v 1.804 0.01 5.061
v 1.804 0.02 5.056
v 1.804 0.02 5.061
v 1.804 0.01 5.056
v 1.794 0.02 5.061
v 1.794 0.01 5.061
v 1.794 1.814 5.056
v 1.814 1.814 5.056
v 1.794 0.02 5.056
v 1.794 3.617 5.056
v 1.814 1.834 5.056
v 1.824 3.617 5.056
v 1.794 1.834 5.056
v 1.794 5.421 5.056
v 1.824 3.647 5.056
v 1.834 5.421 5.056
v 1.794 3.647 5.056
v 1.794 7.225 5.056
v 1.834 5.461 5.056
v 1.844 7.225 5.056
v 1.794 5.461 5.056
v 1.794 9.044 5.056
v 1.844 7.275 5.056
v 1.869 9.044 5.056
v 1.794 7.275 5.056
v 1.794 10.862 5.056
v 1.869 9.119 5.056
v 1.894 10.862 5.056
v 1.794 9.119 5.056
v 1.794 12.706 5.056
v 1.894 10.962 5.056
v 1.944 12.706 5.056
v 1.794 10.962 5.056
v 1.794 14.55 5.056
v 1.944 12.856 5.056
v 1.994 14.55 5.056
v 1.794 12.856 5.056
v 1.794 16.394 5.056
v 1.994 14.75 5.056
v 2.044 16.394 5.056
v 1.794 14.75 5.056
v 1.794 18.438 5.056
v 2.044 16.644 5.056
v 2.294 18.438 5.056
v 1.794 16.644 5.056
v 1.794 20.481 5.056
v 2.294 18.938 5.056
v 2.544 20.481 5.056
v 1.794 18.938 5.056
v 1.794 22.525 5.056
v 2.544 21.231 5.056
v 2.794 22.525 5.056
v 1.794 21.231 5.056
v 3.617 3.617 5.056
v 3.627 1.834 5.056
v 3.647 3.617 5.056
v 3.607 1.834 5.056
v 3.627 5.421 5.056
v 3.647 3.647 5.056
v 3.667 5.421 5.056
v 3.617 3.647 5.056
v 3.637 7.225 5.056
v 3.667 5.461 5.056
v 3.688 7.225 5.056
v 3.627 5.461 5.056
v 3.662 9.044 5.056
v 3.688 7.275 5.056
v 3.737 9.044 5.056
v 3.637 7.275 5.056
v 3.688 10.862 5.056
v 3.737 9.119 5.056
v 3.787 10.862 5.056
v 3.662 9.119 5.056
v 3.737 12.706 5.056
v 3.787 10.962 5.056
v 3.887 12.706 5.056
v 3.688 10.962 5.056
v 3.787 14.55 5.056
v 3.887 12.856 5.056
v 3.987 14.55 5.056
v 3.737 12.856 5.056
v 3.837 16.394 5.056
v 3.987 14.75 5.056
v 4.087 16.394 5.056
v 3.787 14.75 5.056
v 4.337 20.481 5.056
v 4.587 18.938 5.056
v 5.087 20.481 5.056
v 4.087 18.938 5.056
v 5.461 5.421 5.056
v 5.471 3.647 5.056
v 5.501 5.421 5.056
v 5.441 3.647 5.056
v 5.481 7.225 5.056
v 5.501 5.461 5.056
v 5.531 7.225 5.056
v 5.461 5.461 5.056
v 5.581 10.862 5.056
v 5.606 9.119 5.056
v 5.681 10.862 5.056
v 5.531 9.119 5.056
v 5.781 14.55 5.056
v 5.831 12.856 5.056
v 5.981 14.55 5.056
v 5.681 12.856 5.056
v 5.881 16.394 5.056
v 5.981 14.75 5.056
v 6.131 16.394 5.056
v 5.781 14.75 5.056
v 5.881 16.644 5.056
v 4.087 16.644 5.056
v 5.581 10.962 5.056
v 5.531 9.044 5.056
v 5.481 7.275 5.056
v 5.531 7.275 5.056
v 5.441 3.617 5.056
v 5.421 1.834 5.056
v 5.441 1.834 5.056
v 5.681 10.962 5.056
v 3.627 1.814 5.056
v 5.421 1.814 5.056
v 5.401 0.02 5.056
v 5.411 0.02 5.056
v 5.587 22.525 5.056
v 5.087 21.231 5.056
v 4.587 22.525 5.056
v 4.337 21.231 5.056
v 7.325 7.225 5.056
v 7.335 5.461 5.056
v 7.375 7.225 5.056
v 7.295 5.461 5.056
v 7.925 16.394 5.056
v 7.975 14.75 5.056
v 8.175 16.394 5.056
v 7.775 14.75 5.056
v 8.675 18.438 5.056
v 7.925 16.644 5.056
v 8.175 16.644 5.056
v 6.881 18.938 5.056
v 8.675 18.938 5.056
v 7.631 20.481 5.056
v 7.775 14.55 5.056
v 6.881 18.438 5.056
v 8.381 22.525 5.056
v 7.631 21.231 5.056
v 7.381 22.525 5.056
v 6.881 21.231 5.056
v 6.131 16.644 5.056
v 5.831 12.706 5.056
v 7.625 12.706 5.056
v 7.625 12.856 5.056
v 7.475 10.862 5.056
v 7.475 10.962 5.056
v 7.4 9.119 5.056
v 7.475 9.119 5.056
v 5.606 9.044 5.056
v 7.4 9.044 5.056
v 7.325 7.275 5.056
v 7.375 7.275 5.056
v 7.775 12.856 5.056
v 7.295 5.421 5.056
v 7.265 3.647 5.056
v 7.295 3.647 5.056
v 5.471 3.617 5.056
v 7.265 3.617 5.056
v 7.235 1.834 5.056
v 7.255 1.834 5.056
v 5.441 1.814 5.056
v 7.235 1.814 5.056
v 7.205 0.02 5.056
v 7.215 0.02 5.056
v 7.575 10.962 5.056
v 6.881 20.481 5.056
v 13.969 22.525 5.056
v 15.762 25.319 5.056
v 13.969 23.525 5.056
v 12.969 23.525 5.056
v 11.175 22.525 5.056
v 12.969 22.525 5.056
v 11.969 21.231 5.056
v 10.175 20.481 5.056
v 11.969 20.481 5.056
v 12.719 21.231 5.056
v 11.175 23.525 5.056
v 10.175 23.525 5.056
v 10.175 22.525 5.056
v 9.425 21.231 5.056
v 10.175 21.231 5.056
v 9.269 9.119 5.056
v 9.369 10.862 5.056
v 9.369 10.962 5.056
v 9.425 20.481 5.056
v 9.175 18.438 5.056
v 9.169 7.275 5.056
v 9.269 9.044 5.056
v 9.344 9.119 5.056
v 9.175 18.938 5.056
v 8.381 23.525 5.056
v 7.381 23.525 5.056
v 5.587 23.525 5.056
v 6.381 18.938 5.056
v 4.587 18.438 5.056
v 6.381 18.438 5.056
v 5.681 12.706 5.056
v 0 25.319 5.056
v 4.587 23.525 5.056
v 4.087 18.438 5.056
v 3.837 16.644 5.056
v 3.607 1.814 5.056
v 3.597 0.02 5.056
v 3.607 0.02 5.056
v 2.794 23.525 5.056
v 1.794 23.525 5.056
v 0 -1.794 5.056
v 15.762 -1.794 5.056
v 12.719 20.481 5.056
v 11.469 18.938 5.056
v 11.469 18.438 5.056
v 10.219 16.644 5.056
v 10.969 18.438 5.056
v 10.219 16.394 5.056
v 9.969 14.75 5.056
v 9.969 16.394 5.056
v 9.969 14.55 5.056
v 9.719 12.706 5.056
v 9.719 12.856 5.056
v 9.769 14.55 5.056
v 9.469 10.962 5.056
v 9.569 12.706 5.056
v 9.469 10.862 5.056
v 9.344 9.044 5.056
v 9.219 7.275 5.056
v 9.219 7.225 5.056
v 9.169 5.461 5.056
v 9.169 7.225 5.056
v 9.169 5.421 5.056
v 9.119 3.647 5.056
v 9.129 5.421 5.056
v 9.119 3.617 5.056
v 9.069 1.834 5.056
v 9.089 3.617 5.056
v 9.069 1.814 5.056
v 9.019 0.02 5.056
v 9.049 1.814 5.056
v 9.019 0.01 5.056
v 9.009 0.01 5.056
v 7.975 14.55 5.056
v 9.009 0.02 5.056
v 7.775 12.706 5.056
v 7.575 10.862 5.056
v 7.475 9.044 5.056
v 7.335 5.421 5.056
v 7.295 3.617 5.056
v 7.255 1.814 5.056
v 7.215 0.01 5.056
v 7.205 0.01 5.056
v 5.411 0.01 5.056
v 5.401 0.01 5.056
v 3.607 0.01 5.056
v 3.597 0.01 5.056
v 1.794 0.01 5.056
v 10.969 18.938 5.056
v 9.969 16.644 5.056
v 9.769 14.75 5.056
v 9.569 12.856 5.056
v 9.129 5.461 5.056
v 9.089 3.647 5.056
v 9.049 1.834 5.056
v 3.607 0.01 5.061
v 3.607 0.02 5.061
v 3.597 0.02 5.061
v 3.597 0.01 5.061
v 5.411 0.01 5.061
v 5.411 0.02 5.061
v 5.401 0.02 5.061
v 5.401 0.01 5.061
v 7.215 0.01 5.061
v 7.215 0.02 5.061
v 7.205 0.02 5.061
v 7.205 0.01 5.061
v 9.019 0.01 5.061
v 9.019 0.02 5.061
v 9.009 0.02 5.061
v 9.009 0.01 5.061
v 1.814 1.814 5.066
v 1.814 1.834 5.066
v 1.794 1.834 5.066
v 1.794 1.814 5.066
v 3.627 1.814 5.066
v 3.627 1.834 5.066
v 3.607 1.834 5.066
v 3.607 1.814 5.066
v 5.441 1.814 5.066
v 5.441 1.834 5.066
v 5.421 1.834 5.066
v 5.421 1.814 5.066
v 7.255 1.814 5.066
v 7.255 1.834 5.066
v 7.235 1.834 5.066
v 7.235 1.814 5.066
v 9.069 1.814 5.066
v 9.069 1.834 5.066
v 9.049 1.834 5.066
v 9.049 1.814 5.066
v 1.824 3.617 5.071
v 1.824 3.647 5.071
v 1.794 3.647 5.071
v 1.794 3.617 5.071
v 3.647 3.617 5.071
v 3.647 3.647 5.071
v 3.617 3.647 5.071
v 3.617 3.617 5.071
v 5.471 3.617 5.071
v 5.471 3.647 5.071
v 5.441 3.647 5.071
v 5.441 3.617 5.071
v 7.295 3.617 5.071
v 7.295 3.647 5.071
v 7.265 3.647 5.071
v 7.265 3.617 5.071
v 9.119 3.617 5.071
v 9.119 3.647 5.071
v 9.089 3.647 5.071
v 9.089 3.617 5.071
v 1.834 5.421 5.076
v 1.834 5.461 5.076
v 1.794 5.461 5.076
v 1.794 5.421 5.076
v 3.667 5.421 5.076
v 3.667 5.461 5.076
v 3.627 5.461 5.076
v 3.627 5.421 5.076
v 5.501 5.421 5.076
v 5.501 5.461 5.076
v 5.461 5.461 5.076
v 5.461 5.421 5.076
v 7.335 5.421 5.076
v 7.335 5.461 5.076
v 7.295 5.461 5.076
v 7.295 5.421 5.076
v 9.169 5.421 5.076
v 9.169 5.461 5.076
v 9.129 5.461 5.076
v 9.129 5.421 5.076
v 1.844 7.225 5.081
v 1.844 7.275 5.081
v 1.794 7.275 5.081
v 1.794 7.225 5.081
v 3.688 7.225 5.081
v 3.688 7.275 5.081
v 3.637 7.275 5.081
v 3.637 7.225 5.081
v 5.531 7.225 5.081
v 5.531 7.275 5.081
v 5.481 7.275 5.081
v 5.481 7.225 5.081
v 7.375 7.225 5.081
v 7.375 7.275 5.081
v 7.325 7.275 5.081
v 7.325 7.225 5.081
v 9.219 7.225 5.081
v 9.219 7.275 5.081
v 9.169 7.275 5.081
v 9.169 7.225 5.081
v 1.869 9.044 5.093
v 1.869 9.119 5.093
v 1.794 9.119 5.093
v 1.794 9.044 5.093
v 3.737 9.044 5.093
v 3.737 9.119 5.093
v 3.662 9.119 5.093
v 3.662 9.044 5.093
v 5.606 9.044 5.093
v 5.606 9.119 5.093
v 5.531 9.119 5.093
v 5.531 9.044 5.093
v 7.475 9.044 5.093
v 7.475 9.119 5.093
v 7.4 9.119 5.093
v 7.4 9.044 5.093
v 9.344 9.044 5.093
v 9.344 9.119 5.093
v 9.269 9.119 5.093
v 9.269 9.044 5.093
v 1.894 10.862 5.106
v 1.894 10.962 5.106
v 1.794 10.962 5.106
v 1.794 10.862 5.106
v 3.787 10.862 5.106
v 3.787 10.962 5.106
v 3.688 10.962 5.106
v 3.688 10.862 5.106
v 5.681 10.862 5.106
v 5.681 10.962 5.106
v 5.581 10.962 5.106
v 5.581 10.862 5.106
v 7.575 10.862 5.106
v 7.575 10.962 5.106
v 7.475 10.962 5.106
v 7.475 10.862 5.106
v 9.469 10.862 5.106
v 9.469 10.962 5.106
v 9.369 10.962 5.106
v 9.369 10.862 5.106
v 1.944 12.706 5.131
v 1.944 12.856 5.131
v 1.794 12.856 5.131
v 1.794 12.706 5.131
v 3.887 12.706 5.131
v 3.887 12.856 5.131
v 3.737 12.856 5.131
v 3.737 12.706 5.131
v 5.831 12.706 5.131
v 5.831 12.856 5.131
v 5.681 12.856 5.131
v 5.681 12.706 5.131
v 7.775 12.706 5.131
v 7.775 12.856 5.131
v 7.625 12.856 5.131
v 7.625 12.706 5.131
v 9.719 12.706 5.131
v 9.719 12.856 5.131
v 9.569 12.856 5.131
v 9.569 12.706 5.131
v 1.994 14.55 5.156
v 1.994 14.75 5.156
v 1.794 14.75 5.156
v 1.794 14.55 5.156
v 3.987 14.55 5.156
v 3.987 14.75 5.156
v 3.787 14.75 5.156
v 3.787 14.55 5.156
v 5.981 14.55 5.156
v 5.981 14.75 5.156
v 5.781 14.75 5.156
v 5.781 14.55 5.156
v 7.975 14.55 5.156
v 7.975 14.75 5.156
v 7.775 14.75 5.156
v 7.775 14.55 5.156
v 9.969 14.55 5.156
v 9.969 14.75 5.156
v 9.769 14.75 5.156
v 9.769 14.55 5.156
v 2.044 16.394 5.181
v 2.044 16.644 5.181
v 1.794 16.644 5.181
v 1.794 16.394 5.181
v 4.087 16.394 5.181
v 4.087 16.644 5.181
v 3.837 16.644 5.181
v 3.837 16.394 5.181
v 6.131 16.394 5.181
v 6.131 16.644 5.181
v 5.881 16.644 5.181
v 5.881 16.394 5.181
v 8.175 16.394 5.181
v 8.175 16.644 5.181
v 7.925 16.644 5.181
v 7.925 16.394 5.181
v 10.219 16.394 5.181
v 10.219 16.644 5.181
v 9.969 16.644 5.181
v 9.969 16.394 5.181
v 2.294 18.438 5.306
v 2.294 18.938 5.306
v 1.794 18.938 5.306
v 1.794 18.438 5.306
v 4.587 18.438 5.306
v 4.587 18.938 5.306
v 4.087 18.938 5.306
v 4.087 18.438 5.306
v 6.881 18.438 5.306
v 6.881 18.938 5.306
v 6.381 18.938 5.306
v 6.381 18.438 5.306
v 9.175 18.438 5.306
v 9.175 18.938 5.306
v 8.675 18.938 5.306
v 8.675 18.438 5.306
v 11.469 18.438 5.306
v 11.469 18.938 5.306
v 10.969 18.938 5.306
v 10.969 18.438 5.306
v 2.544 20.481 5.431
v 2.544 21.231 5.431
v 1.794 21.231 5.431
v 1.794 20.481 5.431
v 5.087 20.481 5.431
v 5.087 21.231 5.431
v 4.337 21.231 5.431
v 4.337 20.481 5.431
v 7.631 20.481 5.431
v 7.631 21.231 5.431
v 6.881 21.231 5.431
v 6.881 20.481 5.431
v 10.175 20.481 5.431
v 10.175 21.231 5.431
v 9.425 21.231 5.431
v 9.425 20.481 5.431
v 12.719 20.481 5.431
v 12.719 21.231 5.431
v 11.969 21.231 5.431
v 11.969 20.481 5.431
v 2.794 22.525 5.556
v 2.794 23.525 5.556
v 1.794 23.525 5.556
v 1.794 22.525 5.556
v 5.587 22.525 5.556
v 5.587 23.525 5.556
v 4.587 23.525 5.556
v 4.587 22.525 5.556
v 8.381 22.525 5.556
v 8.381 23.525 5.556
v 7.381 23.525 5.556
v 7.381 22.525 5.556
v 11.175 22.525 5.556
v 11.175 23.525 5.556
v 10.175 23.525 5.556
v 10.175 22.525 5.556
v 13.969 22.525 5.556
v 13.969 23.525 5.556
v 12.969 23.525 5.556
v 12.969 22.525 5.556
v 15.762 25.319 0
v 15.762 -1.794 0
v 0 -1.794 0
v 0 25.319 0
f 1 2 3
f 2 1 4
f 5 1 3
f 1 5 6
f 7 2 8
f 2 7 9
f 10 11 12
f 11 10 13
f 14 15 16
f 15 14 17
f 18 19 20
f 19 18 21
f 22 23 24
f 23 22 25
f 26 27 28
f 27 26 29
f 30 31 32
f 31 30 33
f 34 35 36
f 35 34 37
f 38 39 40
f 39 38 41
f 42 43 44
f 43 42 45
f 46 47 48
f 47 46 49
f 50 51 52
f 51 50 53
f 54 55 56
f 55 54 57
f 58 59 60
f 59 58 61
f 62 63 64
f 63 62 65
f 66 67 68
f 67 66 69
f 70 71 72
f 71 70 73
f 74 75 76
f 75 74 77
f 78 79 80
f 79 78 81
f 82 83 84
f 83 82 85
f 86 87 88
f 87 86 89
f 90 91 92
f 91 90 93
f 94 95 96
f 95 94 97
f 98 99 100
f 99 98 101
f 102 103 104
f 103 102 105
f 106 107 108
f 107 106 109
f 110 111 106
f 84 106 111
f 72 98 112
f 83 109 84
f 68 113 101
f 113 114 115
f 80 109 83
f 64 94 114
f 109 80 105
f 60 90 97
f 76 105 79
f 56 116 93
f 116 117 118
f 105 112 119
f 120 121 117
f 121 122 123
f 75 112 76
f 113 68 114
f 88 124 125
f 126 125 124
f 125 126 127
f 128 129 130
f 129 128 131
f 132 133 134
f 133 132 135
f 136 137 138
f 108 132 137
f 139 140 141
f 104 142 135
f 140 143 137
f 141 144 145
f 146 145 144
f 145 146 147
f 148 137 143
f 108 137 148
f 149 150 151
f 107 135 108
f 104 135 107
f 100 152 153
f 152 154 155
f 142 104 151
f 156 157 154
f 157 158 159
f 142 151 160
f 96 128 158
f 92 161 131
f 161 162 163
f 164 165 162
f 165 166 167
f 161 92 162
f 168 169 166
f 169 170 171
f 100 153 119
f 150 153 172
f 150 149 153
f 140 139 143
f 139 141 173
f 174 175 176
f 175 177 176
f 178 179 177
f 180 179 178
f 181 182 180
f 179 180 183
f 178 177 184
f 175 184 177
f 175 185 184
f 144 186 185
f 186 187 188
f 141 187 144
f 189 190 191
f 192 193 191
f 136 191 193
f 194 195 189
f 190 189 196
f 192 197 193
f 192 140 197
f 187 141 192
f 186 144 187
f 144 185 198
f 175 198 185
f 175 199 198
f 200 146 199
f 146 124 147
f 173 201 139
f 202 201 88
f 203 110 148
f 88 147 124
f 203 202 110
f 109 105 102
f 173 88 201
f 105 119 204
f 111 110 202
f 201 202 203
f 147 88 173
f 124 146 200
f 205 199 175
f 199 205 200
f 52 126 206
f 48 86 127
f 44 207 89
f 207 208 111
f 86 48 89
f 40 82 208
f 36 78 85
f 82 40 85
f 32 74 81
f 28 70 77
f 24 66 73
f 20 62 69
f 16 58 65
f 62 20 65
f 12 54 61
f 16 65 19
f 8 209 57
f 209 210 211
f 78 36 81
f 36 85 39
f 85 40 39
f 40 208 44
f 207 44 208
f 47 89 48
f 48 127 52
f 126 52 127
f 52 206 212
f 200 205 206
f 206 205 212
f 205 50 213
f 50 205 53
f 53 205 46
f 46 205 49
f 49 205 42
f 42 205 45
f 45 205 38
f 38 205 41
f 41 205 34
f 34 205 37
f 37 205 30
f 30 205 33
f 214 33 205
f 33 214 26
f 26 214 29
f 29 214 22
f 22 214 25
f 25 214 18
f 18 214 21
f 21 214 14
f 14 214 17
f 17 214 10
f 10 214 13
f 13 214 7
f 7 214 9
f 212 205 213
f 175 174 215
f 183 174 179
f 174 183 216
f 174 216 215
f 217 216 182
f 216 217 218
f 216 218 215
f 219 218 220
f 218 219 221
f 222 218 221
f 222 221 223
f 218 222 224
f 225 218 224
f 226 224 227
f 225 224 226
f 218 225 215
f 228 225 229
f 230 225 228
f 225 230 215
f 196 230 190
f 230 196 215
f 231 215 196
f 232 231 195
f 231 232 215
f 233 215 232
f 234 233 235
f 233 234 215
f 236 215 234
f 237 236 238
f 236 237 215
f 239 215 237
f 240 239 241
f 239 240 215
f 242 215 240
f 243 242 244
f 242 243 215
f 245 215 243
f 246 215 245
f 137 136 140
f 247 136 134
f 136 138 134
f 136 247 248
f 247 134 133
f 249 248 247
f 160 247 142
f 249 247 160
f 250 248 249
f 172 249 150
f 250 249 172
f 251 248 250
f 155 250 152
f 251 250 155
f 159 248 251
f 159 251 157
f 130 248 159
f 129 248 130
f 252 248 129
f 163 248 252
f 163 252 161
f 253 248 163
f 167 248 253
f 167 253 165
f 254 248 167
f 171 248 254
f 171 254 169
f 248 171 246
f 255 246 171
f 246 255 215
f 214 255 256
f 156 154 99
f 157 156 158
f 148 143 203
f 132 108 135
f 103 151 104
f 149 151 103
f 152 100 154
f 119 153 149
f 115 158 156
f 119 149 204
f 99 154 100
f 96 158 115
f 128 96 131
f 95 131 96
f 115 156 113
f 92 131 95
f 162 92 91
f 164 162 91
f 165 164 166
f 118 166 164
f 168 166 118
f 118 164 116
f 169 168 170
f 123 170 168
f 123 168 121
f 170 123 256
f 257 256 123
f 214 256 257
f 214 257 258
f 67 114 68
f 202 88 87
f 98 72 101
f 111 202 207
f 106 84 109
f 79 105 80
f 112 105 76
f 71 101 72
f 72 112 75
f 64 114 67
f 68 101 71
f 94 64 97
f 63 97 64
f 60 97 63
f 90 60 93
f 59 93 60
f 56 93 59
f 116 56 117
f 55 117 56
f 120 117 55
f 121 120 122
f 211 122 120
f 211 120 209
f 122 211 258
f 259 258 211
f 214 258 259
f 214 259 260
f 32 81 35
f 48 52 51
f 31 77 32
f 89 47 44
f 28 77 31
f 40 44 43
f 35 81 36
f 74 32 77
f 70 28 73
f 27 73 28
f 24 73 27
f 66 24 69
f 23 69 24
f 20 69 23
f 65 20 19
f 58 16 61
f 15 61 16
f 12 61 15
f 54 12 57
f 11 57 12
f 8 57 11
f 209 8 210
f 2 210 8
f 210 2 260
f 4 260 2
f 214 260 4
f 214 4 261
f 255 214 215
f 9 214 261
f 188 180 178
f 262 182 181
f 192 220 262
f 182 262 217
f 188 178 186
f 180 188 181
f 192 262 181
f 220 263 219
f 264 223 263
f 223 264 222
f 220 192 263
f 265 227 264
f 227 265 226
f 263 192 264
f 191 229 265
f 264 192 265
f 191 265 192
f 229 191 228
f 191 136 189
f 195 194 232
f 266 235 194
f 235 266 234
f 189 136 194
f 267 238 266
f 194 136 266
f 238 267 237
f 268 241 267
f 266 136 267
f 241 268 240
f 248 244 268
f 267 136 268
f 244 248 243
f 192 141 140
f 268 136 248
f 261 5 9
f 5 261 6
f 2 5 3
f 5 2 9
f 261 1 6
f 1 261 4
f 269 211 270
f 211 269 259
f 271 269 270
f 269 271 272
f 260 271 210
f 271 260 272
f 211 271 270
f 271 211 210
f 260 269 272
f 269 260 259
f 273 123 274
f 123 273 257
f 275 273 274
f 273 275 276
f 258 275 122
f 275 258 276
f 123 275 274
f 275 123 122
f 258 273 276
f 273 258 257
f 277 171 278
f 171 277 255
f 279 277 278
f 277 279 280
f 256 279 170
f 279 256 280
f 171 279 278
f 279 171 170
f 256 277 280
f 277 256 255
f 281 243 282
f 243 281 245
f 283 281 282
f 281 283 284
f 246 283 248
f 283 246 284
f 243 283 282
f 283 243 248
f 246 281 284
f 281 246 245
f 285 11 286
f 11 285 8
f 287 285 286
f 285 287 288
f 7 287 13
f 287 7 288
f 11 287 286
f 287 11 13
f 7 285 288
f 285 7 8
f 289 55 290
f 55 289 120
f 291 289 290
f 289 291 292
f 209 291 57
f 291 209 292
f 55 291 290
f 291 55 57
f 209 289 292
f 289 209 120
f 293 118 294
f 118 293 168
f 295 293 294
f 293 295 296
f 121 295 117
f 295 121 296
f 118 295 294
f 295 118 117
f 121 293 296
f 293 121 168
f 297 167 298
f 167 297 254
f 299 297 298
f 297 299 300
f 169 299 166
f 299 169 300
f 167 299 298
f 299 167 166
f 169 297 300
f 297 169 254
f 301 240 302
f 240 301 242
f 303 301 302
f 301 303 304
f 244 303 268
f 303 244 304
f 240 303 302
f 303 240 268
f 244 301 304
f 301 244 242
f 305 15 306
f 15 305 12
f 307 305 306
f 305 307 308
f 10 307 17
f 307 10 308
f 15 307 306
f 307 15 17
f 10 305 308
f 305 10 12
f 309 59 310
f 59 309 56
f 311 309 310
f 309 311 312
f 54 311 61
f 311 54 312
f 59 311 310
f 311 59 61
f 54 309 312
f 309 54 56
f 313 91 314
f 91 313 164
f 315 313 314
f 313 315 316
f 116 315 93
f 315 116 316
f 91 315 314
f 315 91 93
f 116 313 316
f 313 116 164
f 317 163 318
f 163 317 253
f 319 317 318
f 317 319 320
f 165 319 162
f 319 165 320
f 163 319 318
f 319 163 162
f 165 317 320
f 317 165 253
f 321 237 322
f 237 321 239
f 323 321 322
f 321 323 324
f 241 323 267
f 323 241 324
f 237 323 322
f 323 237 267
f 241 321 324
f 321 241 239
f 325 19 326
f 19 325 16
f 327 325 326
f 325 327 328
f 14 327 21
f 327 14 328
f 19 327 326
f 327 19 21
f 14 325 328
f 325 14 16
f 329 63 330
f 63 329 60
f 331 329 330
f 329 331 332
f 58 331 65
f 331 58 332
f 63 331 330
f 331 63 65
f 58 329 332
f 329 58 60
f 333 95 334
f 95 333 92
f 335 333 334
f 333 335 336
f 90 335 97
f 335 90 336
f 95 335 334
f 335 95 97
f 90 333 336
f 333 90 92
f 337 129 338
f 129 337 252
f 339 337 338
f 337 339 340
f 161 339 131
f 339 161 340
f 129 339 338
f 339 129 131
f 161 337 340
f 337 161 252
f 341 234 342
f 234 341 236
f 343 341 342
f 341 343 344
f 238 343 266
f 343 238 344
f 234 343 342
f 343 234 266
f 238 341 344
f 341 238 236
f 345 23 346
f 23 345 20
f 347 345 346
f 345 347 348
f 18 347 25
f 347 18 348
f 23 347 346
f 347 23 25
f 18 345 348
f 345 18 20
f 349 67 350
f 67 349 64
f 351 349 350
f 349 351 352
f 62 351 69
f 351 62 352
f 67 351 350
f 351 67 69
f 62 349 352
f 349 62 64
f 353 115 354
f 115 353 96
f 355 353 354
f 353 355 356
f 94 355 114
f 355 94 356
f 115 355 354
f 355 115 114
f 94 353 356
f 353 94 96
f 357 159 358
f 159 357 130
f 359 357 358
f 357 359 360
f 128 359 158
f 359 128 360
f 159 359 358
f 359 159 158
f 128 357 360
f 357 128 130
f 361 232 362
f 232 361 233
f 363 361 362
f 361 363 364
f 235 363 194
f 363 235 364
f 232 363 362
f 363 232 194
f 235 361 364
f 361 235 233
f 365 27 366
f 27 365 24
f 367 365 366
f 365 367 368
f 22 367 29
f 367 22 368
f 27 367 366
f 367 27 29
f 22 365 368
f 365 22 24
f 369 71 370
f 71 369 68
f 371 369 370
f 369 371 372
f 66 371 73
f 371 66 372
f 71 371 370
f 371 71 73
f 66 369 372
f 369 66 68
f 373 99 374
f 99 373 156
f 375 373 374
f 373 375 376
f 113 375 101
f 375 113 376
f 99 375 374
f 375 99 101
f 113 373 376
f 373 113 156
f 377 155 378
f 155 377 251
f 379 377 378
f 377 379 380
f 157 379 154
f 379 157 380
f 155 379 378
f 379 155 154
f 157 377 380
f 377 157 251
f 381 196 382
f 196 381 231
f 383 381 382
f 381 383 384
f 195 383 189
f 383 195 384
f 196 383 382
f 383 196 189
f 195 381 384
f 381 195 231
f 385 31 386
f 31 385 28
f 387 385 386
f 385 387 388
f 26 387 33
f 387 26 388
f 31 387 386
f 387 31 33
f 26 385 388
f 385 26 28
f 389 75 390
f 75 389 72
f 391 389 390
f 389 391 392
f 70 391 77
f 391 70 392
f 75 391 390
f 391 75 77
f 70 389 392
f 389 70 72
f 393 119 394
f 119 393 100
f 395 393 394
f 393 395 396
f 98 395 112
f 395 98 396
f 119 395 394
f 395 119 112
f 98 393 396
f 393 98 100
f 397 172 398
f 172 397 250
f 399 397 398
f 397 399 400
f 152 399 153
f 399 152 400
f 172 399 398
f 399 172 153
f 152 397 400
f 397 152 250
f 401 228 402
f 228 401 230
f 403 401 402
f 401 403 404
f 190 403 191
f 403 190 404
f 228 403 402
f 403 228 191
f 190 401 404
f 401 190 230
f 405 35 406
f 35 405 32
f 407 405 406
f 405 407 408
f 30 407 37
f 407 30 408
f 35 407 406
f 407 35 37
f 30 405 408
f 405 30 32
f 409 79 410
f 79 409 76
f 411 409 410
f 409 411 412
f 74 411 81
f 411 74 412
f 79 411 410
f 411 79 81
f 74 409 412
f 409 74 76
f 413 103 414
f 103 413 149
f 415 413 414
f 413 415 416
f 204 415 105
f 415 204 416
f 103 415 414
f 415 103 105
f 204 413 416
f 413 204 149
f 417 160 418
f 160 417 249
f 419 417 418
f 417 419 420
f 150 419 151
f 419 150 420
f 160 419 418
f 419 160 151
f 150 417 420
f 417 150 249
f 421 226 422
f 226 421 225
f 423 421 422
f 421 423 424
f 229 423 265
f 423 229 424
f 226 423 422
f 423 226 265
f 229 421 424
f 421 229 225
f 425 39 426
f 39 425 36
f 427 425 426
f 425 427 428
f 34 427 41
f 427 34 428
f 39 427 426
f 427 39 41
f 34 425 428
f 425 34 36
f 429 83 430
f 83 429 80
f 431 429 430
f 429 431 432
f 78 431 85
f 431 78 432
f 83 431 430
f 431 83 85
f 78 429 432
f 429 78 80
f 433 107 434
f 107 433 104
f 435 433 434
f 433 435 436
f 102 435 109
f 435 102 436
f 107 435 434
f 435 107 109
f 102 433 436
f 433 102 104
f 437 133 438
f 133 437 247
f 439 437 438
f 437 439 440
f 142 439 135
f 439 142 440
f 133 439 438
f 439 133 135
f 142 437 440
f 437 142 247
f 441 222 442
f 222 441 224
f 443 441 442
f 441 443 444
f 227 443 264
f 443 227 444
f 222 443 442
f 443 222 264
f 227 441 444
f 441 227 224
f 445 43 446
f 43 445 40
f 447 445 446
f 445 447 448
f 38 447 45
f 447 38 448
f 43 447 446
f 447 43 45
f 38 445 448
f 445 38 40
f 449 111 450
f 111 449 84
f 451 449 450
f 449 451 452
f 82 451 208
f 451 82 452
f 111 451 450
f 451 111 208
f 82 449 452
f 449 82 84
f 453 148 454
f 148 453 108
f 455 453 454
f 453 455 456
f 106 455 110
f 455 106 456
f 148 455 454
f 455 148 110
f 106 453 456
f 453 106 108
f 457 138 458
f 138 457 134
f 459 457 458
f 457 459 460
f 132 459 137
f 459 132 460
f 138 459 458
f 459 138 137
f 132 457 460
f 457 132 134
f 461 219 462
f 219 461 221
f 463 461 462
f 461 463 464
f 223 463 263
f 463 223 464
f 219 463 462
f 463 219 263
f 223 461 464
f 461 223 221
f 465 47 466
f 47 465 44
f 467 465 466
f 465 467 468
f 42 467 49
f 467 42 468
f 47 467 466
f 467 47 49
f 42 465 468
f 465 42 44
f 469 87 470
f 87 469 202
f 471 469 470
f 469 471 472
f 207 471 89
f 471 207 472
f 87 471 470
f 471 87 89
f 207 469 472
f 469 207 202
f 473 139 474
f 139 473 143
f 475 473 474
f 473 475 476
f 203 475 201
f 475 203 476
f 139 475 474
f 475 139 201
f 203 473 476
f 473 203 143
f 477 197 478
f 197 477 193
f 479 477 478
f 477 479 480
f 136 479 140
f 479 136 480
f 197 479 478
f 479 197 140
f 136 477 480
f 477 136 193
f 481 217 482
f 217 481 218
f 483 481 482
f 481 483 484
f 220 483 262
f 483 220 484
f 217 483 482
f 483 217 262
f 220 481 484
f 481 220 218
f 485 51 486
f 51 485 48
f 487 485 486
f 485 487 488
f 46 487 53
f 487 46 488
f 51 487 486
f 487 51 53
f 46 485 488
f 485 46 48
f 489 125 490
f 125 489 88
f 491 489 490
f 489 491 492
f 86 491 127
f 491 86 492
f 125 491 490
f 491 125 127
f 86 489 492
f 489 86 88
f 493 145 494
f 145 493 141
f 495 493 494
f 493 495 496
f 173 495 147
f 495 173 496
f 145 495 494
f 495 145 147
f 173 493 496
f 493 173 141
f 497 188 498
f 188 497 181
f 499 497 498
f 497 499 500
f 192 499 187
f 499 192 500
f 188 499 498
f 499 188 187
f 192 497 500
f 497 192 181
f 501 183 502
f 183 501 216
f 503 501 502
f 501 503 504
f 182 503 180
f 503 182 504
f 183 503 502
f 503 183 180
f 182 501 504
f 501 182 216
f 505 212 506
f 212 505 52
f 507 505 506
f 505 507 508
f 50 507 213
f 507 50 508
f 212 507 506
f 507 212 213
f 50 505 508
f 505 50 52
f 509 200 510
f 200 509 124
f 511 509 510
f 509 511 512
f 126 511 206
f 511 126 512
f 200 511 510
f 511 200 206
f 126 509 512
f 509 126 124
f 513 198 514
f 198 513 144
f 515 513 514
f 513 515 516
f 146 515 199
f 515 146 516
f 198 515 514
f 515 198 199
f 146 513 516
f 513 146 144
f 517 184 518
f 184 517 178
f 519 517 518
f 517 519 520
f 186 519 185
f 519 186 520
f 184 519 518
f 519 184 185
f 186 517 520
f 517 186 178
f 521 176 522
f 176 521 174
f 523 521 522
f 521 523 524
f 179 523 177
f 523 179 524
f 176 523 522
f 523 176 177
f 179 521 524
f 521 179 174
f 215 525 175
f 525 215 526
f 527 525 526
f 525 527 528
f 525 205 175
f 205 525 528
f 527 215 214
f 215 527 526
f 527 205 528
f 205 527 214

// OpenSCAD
//Parameters
  //Number of technical replicates
  numReplications = 5;	
  //Cube sizes to test
  cubeSize = [0.01, 0.02, 0.03, 0.04, 0.05, 0.075, 0.1, 0.15, 0.2, 0.25, 0.5, 0.75, 1];
  //End mill diameter 
  endMillD = 0.79375;  //1/32"
  aspectRatio = 0.5;     //Aspect ratio of test cube
  stockZ = 5.556;

//Maths
  //Add 1mm to end mill diameter to space out replicates
  CubeZ = max(cubeSize)*aspectRatio;
  Spacing = endMillD + 1;
  StockX = ((max(cubeSize)+Spacing)*numReplications);
  StockZ = stockZ - CubeZ; 
  NumOfCubeSizes = len(cubeSize);
  
//uncomment to render
XYTestDevice();

//Module Definition
module XYTestDevice(){
  //Draw stock
  hull(){
    translate([0,-Spacing,0])cube([Spacing+StockX,Spacing,StockZ], center=false);
    for(i = [0 : len(cubeSize)-1]){
      let (YLocation = cubeSize[i]+i*Spacing){
	for (j = [0: numReplications-1]){
	  if (i==len(cubeSize)-1)translate([0,YLocation,0])cube([1,Spacing+cubeSize[i],StockZ], center=false);
	  translate([Spacing+(j*(cubeSize[i]+Spacing)),YLocation,0]){
	    cube([Spacing+cubeSize[i], Spacing+cubeSize[i], StockZ], center=false);
	  }
	}
      }
    }
  }

  //Make test structures 
  for(i = [0 : len(cubeSize)-1]){
    let (YLocation = cubeSize[i]+i*Spacing){
      for (j = [0: numReplications-1]){
        translate([Spacing+(j*(cubeSize[i]+Spacing)),YLocation,StockZ]){
          cube([cubeSize[i], cubeSize[i], cubeSize[i]*aspectRatio], center=false);
        }
      }
    }
  }
}
